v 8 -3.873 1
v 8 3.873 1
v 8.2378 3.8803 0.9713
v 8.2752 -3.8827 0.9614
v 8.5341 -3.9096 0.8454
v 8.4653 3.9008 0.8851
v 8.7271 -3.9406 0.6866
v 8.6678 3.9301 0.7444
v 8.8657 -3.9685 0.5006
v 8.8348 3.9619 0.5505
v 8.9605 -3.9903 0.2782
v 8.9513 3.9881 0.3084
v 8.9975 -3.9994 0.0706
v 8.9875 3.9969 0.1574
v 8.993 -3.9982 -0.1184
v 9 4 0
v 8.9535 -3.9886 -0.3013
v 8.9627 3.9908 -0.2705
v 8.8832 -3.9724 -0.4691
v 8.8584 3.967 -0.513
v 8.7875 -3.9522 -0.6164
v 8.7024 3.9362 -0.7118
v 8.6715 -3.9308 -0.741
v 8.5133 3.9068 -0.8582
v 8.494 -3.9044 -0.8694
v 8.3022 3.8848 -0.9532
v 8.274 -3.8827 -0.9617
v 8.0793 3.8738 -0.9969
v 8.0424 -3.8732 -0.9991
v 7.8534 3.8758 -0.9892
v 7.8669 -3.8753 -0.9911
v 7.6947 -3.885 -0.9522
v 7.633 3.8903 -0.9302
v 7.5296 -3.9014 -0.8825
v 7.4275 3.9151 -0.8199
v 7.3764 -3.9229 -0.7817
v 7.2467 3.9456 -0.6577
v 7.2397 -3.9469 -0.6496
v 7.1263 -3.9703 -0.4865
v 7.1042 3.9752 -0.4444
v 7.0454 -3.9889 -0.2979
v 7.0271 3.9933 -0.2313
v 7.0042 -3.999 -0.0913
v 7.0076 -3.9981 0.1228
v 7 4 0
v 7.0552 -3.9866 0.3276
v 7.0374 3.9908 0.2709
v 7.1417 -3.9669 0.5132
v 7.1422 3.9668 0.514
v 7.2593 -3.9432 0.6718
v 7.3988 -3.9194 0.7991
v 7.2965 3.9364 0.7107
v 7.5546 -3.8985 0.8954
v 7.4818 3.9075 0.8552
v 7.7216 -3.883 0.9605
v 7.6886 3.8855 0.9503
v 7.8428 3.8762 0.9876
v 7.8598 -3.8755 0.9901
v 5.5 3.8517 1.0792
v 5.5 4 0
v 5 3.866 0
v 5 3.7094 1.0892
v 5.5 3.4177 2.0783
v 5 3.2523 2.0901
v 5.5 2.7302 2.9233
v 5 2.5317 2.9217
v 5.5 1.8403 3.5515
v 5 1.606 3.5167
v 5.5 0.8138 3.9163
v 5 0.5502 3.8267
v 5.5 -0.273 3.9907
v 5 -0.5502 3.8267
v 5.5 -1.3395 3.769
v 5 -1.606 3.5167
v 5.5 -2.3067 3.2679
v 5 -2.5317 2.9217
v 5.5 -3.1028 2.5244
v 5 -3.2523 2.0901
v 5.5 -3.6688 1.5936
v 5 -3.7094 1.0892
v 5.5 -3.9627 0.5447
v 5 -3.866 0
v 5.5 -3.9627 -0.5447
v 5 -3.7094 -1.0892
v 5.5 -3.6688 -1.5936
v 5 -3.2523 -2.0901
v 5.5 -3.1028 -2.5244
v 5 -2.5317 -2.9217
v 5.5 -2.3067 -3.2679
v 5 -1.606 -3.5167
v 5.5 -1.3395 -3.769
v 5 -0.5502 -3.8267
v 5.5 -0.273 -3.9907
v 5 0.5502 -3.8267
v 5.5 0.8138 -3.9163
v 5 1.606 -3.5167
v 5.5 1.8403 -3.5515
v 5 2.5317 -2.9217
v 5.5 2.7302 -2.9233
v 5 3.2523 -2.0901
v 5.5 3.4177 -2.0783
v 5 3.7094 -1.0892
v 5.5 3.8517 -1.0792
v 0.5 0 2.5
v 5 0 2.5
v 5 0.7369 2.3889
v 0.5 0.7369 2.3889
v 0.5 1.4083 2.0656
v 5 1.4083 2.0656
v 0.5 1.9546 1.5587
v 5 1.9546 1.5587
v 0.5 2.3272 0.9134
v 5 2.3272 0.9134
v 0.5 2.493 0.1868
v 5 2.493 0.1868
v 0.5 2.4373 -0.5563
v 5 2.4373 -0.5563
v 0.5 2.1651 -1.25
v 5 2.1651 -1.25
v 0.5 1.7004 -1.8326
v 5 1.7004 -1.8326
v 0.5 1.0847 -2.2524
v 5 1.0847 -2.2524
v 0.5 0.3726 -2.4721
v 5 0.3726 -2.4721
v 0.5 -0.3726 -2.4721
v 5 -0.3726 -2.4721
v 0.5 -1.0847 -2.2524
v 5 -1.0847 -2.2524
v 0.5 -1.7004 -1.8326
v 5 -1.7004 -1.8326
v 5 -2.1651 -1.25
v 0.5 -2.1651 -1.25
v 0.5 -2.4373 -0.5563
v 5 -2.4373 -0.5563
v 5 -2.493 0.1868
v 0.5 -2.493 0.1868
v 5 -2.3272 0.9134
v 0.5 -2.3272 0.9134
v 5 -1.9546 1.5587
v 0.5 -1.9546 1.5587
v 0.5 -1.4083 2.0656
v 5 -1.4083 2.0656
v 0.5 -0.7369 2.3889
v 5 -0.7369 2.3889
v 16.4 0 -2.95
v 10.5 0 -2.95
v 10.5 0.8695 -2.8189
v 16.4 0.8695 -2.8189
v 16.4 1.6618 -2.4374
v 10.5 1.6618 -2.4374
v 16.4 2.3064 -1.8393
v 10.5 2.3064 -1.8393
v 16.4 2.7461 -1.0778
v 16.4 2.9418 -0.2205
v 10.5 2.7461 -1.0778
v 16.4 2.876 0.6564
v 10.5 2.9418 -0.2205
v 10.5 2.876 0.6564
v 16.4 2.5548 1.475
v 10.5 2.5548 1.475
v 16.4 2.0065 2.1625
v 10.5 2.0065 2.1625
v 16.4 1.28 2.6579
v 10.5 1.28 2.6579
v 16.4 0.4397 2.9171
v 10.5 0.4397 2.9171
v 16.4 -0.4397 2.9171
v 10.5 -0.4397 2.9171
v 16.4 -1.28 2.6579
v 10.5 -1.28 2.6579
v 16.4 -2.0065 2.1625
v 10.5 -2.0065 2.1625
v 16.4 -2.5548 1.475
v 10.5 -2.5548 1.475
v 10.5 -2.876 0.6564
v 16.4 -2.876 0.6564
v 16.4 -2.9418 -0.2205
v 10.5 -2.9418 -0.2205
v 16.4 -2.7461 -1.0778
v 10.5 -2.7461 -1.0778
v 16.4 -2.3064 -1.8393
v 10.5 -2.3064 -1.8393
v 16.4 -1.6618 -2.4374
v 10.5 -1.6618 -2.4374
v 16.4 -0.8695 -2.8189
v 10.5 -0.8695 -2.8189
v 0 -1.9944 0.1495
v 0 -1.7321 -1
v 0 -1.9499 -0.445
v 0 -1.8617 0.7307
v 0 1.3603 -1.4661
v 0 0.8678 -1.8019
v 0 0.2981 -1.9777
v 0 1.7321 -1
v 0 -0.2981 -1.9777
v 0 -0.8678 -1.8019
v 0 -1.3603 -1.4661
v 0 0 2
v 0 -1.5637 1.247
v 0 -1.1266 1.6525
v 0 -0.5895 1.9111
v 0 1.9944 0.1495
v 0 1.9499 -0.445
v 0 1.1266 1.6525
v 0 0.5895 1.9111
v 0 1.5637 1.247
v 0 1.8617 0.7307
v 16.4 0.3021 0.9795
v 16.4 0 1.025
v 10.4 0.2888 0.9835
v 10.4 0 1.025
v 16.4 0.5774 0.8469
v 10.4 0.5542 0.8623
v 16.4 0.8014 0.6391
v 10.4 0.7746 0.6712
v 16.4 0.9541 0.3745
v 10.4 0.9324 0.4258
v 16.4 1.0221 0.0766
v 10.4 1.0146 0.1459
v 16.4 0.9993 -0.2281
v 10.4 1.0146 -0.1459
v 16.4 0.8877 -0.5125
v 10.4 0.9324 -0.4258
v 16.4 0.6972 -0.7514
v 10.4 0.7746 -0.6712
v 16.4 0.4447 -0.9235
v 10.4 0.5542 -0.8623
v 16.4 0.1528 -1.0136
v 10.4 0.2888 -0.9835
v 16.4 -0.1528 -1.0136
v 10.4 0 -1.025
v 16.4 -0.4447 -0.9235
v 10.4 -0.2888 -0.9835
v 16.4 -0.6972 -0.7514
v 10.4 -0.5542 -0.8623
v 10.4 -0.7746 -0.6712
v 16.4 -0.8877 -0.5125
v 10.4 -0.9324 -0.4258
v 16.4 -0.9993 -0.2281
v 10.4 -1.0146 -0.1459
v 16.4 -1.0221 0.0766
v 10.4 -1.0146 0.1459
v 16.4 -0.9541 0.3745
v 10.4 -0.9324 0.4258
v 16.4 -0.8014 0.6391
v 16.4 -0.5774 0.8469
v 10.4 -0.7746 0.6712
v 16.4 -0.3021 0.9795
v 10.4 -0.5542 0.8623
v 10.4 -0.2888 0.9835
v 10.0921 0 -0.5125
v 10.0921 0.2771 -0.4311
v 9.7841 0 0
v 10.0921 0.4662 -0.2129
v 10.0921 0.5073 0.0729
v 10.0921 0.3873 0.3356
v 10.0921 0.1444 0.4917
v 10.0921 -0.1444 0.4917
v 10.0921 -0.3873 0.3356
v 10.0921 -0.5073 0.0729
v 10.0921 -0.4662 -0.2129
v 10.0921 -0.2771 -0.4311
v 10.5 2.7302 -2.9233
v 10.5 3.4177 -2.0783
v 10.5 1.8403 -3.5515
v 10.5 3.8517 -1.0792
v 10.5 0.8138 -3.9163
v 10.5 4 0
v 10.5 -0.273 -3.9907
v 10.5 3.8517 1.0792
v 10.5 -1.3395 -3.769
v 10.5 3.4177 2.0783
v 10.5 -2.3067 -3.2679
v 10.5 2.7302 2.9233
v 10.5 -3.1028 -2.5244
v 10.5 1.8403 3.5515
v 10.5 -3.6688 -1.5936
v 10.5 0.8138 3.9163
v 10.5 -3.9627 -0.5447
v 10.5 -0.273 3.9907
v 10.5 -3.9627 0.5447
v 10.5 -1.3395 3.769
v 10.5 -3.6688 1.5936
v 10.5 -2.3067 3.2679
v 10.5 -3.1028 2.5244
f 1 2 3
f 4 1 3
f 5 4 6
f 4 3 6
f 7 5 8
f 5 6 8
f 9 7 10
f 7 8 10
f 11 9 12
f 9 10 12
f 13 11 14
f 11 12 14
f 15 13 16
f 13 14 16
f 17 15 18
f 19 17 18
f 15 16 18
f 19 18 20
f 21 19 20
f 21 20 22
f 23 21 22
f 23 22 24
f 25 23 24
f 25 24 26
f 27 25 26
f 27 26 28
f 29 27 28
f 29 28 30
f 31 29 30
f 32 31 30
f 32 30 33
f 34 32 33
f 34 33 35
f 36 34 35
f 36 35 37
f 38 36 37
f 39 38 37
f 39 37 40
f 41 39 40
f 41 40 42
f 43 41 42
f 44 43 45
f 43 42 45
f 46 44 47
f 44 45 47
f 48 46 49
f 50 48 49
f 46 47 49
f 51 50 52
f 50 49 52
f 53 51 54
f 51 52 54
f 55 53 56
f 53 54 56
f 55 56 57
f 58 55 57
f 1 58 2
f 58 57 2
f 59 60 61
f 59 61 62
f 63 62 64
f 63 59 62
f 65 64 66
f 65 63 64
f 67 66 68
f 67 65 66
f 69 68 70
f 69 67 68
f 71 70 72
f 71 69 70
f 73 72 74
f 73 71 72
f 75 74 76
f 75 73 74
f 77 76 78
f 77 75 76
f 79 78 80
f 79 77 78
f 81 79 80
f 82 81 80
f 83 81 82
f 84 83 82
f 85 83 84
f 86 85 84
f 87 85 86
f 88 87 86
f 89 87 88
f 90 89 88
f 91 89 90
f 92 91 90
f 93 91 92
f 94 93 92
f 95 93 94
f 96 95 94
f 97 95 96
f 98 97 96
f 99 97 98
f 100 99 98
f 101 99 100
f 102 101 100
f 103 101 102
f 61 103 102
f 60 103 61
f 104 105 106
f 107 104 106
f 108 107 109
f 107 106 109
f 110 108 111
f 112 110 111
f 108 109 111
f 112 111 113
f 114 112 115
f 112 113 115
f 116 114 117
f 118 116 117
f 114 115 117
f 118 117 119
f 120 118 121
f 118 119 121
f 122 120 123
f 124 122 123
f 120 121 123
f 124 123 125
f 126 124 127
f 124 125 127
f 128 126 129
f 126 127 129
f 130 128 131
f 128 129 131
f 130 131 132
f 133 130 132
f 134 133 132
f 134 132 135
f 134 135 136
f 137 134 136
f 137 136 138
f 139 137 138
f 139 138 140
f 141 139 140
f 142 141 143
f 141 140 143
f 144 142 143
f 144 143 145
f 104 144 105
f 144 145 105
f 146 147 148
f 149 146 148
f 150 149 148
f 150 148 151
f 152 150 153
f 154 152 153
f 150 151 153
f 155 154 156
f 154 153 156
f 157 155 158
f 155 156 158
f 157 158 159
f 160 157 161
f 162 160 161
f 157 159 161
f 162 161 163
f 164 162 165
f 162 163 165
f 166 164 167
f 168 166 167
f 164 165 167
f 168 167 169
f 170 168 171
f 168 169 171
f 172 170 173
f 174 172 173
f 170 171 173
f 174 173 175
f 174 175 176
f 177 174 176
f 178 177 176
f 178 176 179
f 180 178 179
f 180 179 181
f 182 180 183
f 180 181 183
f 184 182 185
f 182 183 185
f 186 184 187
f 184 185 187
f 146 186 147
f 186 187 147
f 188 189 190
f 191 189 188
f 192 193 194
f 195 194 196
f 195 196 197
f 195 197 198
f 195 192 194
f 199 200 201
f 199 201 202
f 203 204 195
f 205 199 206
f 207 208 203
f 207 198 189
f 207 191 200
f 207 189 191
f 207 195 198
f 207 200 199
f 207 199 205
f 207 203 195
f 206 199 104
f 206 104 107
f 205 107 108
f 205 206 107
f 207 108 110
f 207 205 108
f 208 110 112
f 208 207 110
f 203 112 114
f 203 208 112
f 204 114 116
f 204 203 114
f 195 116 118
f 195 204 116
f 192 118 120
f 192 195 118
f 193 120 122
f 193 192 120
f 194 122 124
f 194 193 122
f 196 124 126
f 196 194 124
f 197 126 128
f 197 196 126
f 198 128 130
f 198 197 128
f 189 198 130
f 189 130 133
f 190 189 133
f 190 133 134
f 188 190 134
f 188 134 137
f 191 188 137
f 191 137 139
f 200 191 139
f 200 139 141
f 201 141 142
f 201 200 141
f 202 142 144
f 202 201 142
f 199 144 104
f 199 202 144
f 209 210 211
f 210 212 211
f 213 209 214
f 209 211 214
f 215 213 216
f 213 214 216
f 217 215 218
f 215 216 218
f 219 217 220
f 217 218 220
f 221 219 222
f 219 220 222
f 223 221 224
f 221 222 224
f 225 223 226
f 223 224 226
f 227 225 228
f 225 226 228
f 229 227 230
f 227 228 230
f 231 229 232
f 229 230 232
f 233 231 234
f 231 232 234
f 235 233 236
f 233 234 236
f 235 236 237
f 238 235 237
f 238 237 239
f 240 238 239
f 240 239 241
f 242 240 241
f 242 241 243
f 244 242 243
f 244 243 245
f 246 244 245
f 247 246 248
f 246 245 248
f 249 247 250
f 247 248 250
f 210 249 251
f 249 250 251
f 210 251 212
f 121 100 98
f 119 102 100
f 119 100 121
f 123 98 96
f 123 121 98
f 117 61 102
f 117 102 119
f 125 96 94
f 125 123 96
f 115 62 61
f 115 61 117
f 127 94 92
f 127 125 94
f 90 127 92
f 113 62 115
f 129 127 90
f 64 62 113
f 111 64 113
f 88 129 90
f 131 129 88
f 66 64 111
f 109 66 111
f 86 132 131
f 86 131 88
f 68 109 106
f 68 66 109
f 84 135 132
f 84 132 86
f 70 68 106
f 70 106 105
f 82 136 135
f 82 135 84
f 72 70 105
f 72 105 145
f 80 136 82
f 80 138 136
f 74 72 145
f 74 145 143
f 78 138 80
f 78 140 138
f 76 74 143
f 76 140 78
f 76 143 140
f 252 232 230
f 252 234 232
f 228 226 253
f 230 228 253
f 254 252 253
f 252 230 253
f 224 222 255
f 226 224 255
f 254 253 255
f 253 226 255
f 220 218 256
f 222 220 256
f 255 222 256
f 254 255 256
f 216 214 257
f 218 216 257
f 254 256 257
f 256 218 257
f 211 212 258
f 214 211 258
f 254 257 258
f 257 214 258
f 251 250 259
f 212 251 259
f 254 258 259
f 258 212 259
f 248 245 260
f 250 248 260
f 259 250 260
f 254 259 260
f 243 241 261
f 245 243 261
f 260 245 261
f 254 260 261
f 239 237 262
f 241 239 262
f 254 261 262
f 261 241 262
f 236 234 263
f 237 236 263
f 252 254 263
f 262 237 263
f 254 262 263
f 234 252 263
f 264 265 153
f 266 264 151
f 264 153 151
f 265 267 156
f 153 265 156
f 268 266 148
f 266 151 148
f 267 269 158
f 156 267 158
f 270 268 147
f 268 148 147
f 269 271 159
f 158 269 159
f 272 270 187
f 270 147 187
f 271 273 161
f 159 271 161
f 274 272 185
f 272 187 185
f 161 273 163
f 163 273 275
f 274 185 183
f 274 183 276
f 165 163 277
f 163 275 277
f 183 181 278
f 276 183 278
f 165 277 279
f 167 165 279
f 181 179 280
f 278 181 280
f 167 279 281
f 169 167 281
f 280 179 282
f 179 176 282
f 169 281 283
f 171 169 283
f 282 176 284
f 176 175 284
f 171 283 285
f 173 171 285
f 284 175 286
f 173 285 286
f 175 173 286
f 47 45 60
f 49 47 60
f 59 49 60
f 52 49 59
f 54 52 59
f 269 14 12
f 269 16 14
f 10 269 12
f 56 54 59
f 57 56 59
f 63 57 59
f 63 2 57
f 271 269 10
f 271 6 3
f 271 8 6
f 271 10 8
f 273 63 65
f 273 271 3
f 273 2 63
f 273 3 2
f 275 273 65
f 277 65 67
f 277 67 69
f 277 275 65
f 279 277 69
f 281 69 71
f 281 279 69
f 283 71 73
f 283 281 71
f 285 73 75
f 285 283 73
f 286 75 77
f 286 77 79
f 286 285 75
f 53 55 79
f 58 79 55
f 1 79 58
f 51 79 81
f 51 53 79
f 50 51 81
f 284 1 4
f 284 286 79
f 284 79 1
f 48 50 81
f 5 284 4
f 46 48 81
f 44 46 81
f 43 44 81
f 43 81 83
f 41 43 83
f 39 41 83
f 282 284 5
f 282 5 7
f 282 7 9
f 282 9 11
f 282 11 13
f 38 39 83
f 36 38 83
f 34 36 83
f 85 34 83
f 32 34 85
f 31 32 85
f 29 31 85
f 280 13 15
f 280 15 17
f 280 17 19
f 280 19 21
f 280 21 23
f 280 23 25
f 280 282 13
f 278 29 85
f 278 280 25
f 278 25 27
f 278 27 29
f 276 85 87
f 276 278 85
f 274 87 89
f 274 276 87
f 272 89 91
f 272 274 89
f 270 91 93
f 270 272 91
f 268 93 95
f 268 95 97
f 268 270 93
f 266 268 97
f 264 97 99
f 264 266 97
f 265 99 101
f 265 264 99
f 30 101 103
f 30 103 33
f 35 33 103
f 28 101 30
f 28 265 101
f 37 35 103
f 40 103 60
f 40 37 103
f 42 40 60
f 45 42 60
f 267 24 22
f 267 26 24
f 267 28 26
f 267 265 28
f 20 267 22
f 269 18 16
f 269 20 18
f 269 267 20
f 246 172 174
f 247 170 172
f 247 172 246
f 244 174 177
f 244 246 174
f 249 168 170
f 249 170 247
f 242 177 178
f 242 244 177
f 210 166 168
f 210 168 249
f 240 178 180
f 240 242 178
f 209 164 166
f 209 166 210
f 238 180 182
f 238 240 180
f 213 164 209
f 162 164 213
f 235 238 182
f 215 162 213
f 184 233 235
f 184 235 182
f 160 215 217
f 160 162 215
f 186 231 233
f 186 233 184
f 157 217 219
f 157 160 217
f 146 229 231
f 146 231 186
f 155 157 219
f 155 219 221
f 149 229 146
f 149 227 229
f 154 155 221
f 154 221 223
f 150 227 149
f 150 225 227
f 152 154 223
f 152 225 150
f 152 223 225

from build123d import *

# Parameters (mm, degrees)
SKETCH1_W                          = 5.5
SKETCH1_H                          = 4
SKETCH2_R                          = 2.5
BOSS_EXTRUDE1_DEPTH                = 5
SKETCH3_R                          = 2.95
BOSS_EXTRUDE2_DEPTH                = 5.9
F_2_0_2_DIAMETER_HOLE1_D           = 2
F_2_0_2_DIAMETER_HOLE1_DEPTH       = 8
TAP_DRILL_FOR_M2_5X0_45_TAP1_D     = 2.05
TAP_DRILL_FOR_M2_5X0_45_TAP1_DEPTH = 6
TAP_DRILL_FOR_M2_5X0_45_TAP1_TIP   = 0.615882135
CHAMFER1_SIZE                      = 0.5
CHAMFER2_SIZE                      = 0.133974596
CHAMFER2_SIZE2                     = 0.5


with BuildPart() as part:
    # Sketch1 → Revolve1 (revolve)
    with BuildSketch(Plane.XY):
        with Locations((7.75, 2)):
            Rectangle(SKETCH1_W, SKETCH1_H)
    revolve(axis=Axis((5, 0, 0), (1, 0, 0)))

    # Sketch2 → Boss-Extrude1 (add)
    with BuildSketch(Plane.ZY.offset(-5)):
        Circle(SKETCH2_R)
    extrude(amount=BOSS_EXTRUDE1_DEPTH)

    # Sketch3 → Boss-Extrude2 (add)
    with BuildSketch(Plane(origin=(10.5, 0, 0), x_dir=(0, 0, -1), z_dir=(1, 0, 0))):
        Circle(SKETCH3_R)
    extrude(amount=BOSS_EXTRUDE2_DEPTH)

    # Ø2.0 (2) Diameter Hole1
    with Locations(Plane(origin=(8, -4, 0), x_dir=(0, 0, -1), z_dir=(0, -1, 0))):
        with Locations((0, 0)):
            Hole(F_2_0_2_DIAMETER_HOLE1_D / 2, depth=F_2_0_2_DIAMETER_HOLE1_DEPTH)

    # Tap Drill for M2.5x0.45 Tap1
    with Locations(Plane(origin=(16.4, 0, 0), x_dir=(0, 0, -1), z_dir=(1, 0, 0))):
        with Locations((0, 0)):
            Hole(TAP_DRILL_FOR_M2_5X0_45_TAP1_D / 2, depth=TAP_DRILL_FOR_M2_5X0_45_TAP1_DEPTH)
            with Locations((0, 0, -(TAP_DRILL_FOR_M2_5X0_45_TAP1_DEPTH + TAP_DRILL_FOR_M2_5X0_45_TAP1_TIP / 2))):  # 118° drill point
                Cone(0, TAP_DRILL_FOR_M2_5X0_45_TAP1_D / 2, TAP_DRILL_FOR_M2_5X0_45_TAP1_TIP, mode=Mode.SUBTRACT)

    # Chamfer1
    chamfer1_edges = [part.edges().sort_by_distance(p)[0] for p in [
        (0, 0, -2.5),
    ]]
    chamfer(chamfer1_edges, length=CHAMFER1_SIZE)

    # Chamfer2
    chamfer2_edges = [part.edges().sort_by_distance(p)[0] for p in [
        (5, -4, 0),
    ]]
    chamfer2_side = [part.faces().sort_by_distance(p)[0] for p in [
        (5, -3.886862915, 0),
    ]]
    chamfer(chamfer2_edges, length=CHAMFER2_SIZE, length2=CHAMFER2_SIZE2, reference=chamfer2_side[0])


solid = part.part
